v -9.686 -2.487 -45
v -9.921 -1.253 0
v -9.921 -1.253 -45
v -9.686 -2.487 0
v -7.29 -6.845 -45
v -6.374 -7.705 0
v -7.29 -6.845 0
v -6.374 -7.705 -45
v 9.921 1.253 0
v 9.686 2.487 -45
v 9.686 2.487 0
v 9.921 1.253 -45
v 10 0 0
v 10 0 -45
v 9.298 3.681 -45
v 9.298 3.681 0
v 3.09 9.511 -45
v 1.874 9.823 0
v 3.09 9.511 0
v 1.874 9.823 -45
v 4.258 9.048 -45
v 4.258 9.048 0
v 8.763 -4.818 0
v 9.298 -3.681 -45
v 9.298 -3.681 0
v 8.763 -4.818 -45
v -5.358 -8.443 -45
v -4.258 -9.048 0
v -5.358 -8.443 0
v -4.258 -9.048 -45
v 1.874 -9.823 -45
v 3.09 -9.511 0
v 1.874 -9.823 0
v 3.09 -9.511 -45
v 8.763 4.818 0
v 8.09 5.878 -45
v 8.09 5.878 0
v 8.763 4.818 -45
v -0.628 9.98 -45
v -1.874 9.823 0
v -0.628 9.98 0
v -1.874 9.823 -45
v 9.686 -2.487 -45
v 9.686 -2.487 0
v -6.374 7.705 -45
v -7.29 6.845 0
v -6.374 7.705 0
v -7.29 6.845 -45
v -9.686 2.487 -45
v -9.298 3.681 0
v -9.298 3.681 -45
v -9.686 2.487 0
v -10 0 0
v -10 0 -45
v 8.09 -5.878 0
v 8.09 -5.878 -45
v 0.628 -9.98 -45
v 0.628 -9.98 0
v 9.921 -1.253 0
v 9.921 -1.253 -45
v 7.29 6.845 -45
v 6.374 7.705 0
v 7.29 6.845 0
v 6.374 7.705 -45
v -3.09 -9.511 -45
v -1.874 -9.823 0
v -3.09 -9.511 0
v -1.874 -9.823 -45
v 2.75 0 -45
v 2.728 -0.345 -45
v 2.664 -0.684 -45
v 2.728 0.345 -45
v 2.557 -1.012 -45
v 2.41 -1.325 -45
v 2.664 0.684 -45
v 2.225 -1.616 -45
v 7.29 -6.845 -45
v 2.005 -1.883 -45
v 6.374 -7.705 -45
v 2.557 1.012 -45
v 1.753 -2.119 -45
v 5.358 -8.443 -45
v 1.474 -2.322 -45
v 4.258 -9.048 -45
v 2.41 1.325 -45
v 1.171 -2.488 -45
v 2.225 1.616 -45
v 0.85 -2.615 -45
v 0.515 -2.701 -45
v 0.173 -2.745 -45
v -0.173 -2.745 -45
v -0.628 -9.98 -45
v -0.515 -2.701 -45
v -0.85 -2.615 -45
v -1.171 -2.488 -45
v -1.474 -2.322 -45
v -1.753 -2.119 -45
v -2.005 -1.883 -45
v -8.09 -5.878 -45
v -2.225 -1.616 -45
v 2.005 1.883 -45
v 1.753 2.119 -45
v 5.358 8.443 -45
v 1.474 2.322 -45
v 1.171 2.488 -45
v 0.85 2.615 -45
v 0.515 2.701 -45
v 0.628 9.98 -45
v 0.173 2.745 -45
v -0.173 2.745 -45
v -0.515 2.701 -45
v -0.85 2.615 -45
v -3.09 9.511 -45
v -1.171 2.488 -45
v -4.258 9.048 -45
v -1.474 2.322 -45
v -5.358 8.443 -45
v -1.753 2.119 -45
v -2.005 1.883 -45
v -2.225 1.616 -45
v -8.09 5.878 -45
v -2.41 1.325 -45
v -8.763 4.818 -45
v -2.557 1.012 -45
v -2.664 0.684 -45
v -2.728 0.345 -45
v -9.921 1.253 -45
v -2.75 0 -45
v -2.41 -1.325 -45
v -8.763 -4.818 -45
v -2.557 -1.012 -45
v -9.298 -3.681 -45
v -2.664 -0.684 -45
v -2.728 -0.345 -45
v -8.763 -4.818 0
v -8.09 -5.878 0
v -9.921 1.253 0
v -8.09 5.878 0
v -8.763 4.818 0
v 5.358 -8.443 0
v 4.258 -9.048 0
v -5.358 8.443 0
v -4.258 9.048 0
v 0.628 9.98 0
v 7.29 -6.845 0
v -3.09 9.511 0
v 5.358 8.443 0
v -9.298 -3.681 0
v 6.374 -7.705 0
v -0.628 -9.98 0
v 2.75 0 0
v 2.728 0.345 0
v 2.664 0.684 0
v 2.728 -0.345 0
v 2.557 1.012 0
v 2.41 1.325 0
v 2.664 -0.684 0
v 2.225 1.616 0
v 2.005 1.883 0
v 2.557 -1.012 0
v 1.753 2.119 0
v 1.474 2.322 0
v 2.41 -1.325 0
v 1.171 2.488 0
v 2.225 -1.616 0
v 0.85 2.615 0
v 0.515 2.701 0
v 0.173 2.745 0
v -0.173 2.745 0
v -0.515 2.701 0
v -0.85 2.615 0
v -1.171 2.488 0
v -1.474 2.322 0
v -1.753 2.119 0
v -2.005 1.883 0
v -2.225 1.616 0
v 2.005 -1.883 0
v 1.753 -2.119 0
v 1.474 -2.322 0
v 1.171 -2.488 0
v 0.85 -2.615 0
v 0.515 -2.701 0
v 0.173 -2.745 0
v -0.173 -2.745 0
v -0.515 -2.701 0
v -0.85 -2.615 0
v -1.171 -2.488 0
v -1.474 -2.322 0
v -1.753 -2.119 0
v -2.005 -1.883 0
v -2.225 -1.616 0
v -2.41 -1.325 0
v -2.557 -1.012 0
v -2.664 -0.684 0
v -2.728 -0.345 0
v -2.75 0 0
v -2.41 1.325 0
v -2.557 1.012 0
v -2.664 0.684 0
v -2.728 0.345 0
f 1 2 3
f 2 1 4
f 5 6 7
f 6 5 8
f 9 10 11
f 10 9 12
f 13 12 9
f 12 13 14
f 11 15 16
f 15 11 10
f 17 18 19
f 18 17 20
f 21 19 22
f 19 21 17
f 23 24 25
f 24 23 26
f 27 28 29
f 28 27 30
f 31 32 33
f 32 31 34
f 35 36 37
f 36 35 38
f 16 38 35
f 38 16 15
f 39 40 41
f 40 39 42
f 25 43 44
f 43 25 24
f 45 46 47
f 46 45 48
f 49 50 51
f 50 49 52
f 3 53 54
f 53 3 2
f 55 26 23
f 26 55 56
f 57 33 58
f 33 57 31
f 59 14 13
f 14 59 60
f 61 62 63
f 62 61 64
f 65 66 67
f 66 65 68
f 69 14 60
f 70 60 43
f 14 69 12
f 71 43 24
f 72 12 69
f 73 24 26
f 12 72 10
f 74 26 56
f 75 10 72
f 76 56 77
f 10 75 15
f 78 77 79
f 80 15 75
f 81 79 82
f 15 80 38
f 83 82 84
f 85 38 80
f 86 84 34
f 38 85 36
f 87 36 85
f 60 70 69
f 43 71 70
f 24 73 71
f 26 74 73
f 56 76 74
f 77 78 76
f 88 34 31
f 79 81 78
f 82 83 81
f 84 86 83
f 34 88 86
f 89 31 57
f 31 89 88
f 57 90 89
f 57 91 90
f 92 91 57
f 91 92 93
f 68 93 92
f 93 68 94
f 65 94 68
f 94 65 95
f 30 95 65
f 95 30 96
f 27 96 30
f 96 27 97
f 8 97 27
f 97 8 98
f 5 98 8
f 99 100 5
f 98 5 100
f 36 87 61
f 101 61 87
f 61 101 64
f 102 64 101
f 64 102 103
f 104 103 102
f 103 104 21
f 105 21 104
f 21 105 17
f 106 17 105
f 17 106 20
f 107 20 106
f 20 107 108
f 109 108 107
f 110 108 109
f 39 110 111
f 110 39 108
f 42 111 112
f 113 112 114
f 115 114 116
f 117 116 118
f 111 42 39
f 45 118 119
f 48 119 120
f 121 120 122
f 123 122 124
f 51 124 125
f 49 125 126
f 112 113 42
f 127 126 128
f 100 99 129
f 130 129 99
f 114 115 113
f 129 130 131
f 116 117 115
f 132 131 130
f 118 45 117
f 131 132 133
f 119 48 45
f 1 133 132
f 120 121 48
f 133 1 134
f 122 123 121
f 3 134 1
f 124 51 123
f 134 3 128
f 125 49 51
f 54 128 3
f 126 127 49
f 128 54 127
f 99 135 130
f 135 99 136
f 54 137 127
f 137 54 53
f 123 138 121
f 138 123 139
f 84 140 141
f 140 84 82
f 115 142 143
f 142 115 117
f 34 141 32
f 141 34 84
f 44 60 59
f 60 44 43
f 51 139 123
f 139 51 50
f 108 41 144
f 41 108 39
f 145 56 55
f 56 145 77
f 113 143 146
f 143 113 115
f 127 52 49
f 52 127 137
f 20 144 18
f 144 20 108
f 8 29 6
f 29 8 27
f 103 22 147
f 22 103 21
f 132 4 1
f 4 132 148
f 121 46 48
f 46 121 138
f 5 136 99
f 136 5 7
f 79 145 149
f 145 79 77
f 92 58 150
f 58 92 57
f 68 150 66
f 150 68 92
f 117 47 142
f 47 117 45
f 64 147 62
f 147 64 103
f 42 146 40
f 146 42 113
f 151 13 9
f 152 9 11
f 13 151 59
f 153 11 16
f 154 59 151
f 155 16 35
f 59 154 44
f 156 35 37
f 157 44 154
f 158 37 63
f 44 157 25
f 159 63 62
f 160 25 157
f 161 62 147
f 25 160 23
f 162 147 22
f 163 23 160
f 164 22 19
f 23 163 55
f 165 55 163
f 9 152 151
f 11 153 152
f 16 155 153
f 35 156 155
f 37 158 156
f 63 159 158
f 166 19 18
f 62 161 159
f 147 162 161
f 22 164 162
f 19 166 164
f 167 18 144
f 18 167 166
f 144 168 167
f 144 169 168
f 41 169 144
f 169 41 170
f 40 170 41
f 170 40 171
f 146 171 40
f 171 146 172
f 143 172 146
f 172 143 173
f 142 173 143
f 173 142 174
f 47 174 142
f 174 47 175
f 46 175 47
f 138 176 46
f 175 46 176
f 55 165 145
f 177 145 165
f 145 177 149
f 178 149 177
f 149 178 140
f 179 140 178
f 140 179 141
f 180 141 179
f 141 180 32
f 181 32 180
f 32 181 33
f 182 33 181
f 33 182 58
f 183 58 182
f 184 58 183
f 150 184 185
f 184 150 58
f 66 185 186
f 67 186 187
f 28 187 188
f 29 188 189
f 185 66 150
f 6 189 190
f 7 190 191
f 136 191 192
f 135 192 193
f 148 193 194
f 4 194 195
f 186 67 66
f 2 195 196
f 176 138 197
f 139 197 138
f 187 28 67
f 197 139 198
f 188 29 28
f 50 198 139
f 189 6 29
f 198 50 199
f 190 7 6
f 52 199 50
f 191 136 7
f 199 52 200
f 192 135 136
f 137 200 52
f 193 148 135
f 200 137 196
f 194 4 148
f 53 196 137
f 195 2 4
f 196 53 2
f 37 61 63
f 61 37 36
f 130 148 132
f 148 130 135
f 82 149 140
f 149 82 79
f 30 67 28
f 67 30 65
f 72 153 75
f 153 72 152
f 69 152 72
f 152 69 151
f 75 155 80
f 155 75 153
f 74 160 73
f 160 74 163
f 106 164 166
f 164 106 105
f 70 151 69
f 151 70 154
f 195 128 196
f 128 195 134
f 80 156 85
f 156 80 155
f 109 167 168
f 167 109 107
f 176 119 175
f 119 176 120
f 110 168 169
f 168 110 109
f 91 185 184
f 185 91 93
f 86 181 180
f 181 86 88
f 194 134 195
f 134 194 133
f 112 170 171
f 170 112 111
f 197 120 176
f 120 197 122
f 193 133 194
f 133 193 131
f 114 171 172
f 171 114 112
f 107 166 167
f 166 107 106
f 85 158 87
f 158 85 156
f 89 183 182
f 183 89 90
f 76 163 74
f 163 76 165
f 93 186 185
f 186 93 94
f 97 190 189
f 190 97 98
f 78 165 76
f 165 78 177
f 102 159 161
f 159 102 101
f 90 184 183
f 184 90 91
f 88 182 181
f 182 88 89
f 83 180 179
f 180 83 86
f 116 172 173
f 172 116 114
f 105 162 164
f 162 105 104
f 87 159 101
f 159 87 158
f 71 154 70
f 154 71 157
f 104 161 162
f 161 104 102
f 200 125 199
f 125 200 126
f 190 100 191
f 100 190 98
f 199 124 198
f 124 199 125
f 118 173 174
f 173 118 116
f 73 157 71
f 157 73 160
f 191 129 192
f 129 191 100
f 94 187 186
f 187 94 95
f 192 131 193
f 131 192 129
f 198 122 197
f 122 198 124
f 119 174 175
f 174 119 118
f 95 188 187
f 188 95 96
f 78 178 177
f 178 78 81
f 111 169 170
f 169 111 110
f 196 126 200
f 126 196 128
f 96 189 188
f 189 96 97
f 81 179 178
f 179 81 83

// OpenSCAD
$fn = 50;


difference() {
	union() {
		translate(v = [0, 0, -45.0000000000]) {
			cylinder(h = 45, r = 10.0000000000);
		}
		cylinder(h = 0, r = 19.0000000000);
	}
	union() {
		#translate(v = [0, 0, -45]) {
			cylinder(h = 45, r = 2.7500000000);
		}
	}
}
